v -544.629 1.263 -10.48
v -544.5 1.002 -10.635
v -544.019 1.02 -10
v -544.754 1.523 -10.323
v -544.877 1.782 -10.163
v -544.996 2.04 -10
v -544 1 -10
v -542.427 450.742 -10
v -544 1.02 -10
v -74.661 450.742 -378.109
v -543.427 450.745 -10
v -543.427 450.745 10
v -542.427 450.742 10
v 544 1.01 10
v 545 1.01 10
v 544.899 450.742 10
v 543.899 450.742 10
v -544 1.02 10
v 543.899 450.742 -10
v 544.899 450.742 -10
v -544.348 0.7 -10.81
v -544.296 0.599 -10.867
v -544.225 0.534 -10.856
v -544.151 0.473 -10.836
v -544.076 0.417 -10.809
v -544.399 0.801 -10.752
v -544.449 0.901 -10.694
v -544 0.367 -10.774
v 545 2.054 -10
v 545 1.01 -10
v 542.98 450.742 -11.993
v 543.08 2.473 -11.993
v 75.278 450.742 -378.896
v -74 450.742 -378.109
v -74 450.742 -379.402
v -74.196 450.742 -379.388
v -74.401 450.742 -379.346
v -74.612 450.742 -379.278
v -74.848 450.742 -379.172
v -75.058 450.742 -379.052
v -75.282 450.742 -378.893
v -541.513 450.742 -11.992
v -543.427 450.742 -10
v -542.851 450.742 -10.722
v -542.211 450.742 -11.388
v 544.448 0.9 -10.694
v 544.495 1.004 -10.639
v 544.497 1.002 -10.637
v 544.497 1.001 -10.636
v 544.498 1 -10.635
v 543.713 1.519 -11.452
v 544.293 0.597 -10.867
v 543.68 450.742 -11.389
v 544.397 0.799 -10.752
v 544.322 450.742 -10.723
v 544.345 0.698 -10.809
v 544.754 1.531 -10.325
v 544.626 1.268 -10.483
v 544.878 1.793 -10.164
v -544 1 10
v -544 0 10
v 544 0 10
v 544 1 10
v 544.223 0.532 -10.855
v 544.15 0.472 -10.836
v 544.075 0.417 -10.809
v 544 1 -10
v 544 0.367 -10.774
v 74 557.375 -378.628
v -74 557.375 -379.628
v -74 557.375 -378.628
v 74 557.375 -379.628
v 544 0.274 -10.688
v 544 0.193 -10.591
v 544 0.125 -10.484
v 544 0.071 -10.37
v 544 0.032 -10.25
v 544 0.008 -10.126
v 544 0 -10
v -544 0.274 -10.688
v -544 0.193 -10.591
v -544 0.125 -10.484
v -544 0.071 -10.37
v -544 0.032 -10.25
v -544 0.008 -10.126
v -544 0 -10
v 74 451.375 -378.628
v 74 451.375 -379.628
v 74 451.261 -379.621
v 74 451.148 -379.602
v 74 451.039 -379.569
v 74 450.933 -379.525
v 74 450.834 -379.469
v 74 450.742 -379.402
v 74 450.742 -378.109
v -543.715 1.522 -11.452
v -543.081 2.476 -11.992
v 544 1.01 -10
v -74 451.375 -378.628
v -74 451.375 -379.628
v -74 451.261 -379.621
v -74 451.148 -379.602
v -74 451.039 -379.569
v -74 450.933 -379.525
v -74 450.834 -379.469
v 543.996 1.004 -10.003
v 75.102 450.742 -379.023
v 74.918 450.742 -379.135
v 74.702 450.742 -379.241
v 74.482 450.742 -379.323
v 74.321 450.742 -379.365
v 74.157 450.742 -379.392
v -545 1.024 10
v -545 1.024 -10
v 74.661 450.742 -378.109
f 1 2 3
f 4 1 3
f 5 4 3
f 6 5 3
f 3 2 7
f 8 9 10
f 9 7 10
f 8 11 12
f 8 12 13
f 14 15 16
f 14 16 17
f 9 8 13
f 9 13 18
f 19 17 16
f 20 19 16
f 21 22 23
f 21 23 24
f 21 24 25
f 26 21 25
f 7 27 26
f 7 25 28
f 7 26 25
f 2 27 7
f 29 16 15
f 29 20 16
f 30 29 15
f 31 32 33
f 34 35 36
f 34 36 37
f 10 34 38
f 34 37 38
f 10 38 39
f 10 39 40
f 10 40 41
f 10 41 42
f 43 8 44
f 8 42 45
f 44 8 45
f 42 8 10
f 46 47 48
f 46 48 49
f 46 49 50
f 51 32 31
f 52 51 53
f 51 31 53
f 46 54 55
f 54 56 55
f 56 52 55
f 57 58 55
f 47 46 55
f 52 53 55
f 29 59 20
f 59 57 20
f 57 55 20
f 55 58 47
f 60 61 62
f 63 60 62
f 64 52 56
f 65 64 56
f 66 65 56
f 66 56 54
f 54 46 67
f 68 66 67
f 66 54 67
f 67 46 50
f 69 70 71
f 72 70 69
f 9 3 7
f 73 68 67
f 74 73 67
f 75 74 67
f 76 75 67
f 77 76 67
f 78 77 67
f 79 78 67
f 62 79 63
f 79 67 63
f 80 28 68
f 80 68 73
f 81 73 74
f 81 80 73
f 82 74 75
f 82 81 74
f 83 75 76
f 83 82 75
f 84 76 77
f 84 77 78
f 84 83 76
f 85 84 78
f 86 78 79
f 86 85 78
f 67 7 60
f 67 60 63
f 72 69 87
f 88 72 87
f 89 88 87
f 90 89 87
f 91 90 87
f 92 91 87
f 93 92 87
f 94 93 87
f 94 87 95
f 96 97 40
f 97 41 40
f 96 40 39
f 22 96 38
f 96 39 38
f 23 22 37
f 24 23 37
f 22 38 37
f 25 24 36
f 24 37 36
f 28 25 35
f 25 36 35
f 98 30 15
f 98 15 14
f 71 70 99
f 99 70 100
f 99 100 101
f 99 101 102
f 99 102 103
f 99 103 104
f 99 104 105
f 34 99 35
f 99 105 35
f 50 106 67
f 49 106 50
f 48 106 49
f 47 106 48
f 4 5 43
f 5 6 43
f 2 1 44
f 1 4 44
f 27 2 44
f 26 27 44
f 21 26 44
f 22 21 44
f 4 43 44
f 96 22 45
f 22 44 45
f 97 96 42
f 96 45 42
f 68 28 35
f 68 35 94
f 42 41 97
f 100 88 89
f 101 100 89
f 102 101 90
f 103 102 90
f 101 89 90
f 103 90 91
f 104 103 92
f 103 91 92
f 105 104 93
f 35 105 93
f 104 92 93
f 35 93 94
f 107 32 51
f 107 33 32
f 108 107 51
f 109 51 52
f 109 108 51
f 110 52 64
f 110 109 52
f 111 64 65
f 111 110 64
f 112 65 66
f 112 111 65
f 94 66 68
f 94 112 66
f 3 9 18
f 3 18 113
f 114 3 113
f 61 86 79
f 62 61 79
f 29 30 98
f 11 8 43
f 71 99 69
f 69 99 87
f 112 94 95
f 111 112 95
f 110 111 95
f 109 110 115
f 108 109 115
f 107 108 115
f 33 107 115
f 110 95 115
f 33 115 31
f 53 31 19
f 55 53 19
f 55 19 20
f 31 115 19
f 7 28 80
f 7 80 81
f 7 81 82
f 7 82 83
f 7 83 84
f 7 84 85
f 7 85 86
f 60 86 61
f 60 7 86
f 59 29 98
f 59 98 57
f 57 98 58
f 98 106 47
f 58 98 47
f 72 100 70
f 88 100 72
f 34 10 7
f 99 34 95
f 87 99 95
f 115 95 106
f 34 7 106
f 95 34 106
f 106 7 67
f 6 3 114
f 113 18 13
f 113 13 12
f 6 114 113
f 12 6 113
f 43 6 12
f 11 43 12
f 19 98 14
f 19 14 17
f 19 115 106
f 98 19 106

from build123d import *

# Parameters (mm, degrees)
SKETCH1_W               = 1088
SKETCH1_H               = 20
BOSS_EXTRUDE1_DEPTH     = 1
BOSS_EXTRUDE4_DEPTH     = 1088
SKETCH5_W               = 1088
SKETCH5_H               = 1
BOSS_EXTRUDE5_DEPTH     = 582
BOSS_EXTRUDE6_DEPTH     = 1088
SKETCH7_W               = 148
SKETCH7_H               = 1
BOSS_EXTRUDE7_DEPTH     = 106
CUT_EXTRUDE3_DEPTH      = 148
SKETCH13_W              = 470
SKETCH13_H              = 1
CUT_REVOLVE1_ANGLE      = 39.3
BOSS_EXTRUDE11_DEPTH    = 748.0802096
BOSS_EXTRUDE12_DEPTH    = 800
SKETCH18_W              = 570.021392147
SKETCH18_H              = 387.152750426
CUT_EXTRUDE5_DEPTH      = 1477.790454702
CUT_EXTRUDE6_DEPTH      = 800
CUT_EXTRUDE6_DEPTH_BACK = 10
BOSS_EXTRUDE13_DEPTH    = 748.0802096
BOSS_EXTRUDE14_DEPTH    = 748.0802096
SKETCH21_W              = 476.858853826
SKETCH21_H              = 325.647229621
CUT_EXTRUDE7_DEPTH      = 1432.718358443
CUT_EXTRUDE9_DEPTH      = 10
CUT_EXTRUDE9_DEPTH_BACK = 946.037072047
BOSS_EXTRUDE15_DEPTH    = 20
FILLET1_R               = 10
BOSS_EXTRUDE20_DEPTH    = 20
FILLET2_R               = 10


with BuildPart() as part:
    # Sketch1 → Boss-Extrude1 (new body)
    with BuildSketch(Plane(origin=(0, 0, 0), x_dir=(1, 0, 0), z_dir=(0, 1, 0))):
        Rectangle(SKETCH1_W, SKETCH1_H)
    extrude(amount=BOSS_EXTRUDE1_DEPTH)

    # Sketch4 → Boss-Extrude4 (add)
    with BuildSketch(Plane.ZY.offset(544)):
        with BuildLine():
            Line((-10, 1), (-10.77384021, 0.366619127))
            ThreePointArc((-10.77384021, 0.366619127), (-10.428146661, 0.096290735), (-10, 0))
            Line((-10, 0), (-10, 1))
        make_face()
    extrude(amount=-BOSS_EXTRUDE4_DEPTH)

    # Sketch5 → Boss-Extrude5 (add)
    with BuildSketch(Plane(origin=(0, 5.500184543, -4.501848885), x_dir=(1, 0, 0), z_dir=(0, 0.7738402097265025, -0.6333808726275548))):
        with Locations((0, 7.605021225)):
            Rectangle(SKETCH5_W, SKETCH5_H)
    extrude(amount=BOSS_EXTRUDE5_DEPTH)

    # Sketch6 → Boss-Extrude6 (add)
    with BuildSketch(Plane(origin=(544, 0, 0), x_dir=(0, 0, -1), z_dir=(1, 0, 0))):
        with BuildLine():
            Line((378.627667869, 451.375002061), (379.627667869, 451.375002061))
            ThreePointArc((379.627667869, 451.375002061), (379.569432227, 451.038728519), (379.401508079, 450.741621188))
            Line((379.401508079, 450.741621188), (378.627667869, 451.375002061))
        make_face()
    extrude(amount=-BOSS_EXTRUDE6_DEPTH)

    # Sketch7 → Boss-Extrude7 (add)
    with BuildSketch(Plane(origin=(0, 451.375002061, 0), x_dir=(1, 0, 0), z_dir=(0, 1, 0))):
        with Locations((0, 379.127667869)):
            Rectangle(SKETCH7_W, SKETCH7_H)
    extrude(amount=BOSS_EXTRUDE7_DEPTH)

    # Sketch8 → Cut-Extrude3 (cut)
    with BuildSketch(Plane(origin=(0, -4.500184543, -5.498151115), x_dir=(1, 0, 0), z_dir=(0, 0.6333808726275547, 0.7738402097265025))):
        Polygon((74, 589.107648936), (544, 7.107648936), (544, 589.107648936), align=None)
        Polygon((-74, 589.107648936), (-544, 7.107648936), (-544, 589.107648936), align=None)
    extrude(amount=-CUT_EXTRUDE3_DEPTH, mode=Mode.SUBTRACT)

    # Sketch13 → Cut-Revolve1 (revolve, cut)
    with BuildSketch(Plane(origin=(0, 451.375002061, 0), x_dir=(1, 0, 0), z_dir=(0, 1, 0))):
        with Locations((309, 379.127667869)):
            Rectangle(SKETCH13_W, SKETCH13_H)
        with Locations((-309, 379.127667869)):
            Rectangle(SKETCH13_W, SKETCH13_H)
    revolve(axis=Axis((-544, 451.375002061, -378.627667869), (-1, 0, 0)), revolution_arc=CUT_REVOLVE1_ANGLE, mode=Mode.SUBTRACT)

    # 3DSketch8 → Boss-Extrude11 (add)
    with BuildSketch(Plane(origin=(-74, 450.741621188, -379.401508079), x_dir=(0, 0.6333808726023494, 0.7738402097471327), z_dir=(-0.6282748747614416, -0.602041059623436, 0.49276489756372194))):
        with BuildLine():
            Line((0, 0), (1, 0))
            Line((1, 0), (0.393252863, 0.794894906))
            ThreePointArc((0.393252863, 0.794894906), (0.103688911, 0.443425791), (0, 0))
        make_face()
    extrude(amount=BOSS_EXTRUDE11_DEPTH)

    # Sketch17 → Boss-Extrude12 (add)
    with BuildSketch(Plane(origin=(-119.830134924, 202.692581564, 94.858610661), x_dir=(0.8810391406721232, 0.4420570737301439, 0.16839114041085765), z_dir=(-0.4720440788324485, 0.7984621982715473, 0.37367433089602736))):
        Polygon((69.885181219, 532.84001368), (70.561407095, 532.10331933), (70.579071373, 532.119533725), (69.90284514, 532.856227747), align=None)
        Polygon((-481.203373087, 26.984765587), (-480.527146854, 26.248071566), (70.561407095, 532.10331933), (69.885181219, 532.84001368), align=None)
    extrude(amount=BOSS_EXTRUDE12_DEPTH)

    # Sketch18 → Cut-Extrude5 (cut, through all)
    with BuildSketch(Plane(origin=(0, 1, 0), x_dir=(1, 0, 0), z_dir=(0, 1, 0))):
        with Locations((-773.718733555, -183.576375213)):
            Rectangle(SKETCH18_W, SKETCH18_H)
    extrude(amount=CUT_EXTRUDE5_DEPTH, mode=Mode.SUBTRACT)

    # 3DSketch9 → Cut-Extrude6 (cut, two sides: drawn at the far end of the back side and taken through both)
    with BuildSketch(Plane(origin=(-74, 450.741621188, -379.401508079), x_dir=(-0.7561274717373775, 0.6544243626913974, 3.634948491477008e-14), z_dir=(0, 0, 1)).offset(-CUT_EXTRUDE6_DEPTH_BACK)):
        Polygon((0, 0), (591.099614486, 511.59361742), (1033.881208267, 0), (442.781593781, -511.59361742), align=None)
    extrude(amount=CUT_EXTRUDE6_DEPTH + CUT_EXTRUDE6_DEPTH_BACK, mode=Mode.SUBTRACT)

    # 3DSketch11 → Boss-Extrude13 (add)
    with BuildSketch(Plane(origin=(74, 450.741621188, -379.401508079), x_dir=(0, 0.6333808726276229, 0.7738402097264466), z_dir=(-0.6282748747614613, 0.60204105960733, -0.4927648975833744))):
        with BuildLine():
            Line((0, 0), (1, 0))
            Line((1, 0), (0.391238571, 0.79335334))
            ThreePointArc((0.391238571, 0.79335334), (0.103127258, 0.44228869), (0, 0))
        make_face()
    extrude(amount=-BOSS_EXTRUDE13_DEPTH)

    # Sketch20 → Boss-Extrude14 (add)
    with BuildSketch(Plane(origin=(120.641152421, 203.389944625, 94.67657513), x_dir=(0.8807290157776859, -0.4307943838243474, -0.19680599491039222), z_dir=(0.47361118117402395, 0.7984651172491827, 0.37167984287985667))):
        Polygon((-54.061283152, 534.279462102), (-54.759673843, 533.563745369), (480.649426942, 11.115806908), (481.347817633, 11.831523641), align=None)
    extrude(amount=BOSS_EXTRUDE14_DEPTH)

    # Sketch21 → Cut-Extrude7 (cut, through all)
    with BuildSketch(Plane(origin=(0, 1, 0), x_dir=(1, 0, 0), z_dir=(0, 1, 0))):
        with Locations((750.93268392, -152.823614809)):
            Rectangle(SKETCH21_W, SKETCH21_H)
    extrude(amount=CUT_EXTRUDE7_DEPTH, mode=Mode.SUBTRACT)

    # 3DSketch12 → Cut-Extrude9 (cut, two sides: drawn at the far end of the back side and taken through both)
    with BuildSketch(Plane(origin=(74, 450.741621188, -379.401508079), x_dir=(0.7338585271859536, 0.6793023348086353, 3.7729204364225037e-14), z_dir=(0, 0, -1)).offset(-CUT_EXTRUDE9_DEPTH_BACK)):
        Polygon((0, 0), (611.708587654, 566.233213109), (1135.847136792, 0), (524.138549137, -566.233213109), align=None)
    extrude(amount=CUT_EXTRUDE9_DEPTH + CUT_EXTRUDE9_DEPTH_BACK, mode=Mode.SUBTRACT)

    # Sketch23 → Boss-Extrude15 (add)
    with BuildSketch(Plane.XY.offset(-10.000000002)):
        Polygon((543.999997701, 1.01026286), (543.899342545, 450.741621188), (544.899342545, 450.741845), (544.999997701, 1.010486671), align=None)
    extrude(amount=BOSS_EXTRUDE15_DEPTH)

    # Fillet1
    # the kernel refuses this fillet: 10 mm, written as the material it takes off along each edge
    with BuildSketch(Plane(origin=(545.517698589, 458.812119138, -10.000000002), x_dir=(-0.7867889291912172, -0.0001760925956154425, -0.6172221236261185), z_dir=(0.00022381172976857925, -0.9999999749541545, 0))) as fillet1_piece_1:
        with BuildLine():
            CenterArc((3.228199261, -10), FILLET1_R, 90, 15.90399317)
            Line((0.487936805, -0.382777861), (0, 0))
            Line((0, 0), (3.228199261, 0))
        make_face()
    extrude(amount=464.182000108, mode=Mode.SUBTRACT)

    # Sketch26 → Boss-Extrude20 (add)
    with BuildSketch(Plane.XY.offset(-10)):
        Polygon((-542.426656099, 450.741621188), (-543.999929799, 1.020067072), (-544.999929799, 1.023565401), (-543.426656099, 450.745119517), align=None)
    extrude(amount=BOSS_EXTRUDE20_DEPTH)

    # Fillet2
    # the kernel refuses this fillet: 10 mm, written as the material it takes off along each edge
    with BuildSketch(Plane(origin=(-544.015507205, 458.793802403, -10), x_dir=(0.7858388463706936, -0.0027491223803662495, -0.618425217678674), z_dir=(-0.003498307026844443, -0.9999938809052514, 0))) as fillet2_piece_1:
        with BuildLine():
            CenterArc((3.220892195, 10), FILLET2_R, 254.121260496, 15.878739504)
            Line((0.484868888, 0.381570998), (0, 0))
            Line((0, 0), (3.220892195, 0))
        make_face()
    extrude(amount=464.167480485, mode=Mode.SUBTRACT)


solid = part.part
